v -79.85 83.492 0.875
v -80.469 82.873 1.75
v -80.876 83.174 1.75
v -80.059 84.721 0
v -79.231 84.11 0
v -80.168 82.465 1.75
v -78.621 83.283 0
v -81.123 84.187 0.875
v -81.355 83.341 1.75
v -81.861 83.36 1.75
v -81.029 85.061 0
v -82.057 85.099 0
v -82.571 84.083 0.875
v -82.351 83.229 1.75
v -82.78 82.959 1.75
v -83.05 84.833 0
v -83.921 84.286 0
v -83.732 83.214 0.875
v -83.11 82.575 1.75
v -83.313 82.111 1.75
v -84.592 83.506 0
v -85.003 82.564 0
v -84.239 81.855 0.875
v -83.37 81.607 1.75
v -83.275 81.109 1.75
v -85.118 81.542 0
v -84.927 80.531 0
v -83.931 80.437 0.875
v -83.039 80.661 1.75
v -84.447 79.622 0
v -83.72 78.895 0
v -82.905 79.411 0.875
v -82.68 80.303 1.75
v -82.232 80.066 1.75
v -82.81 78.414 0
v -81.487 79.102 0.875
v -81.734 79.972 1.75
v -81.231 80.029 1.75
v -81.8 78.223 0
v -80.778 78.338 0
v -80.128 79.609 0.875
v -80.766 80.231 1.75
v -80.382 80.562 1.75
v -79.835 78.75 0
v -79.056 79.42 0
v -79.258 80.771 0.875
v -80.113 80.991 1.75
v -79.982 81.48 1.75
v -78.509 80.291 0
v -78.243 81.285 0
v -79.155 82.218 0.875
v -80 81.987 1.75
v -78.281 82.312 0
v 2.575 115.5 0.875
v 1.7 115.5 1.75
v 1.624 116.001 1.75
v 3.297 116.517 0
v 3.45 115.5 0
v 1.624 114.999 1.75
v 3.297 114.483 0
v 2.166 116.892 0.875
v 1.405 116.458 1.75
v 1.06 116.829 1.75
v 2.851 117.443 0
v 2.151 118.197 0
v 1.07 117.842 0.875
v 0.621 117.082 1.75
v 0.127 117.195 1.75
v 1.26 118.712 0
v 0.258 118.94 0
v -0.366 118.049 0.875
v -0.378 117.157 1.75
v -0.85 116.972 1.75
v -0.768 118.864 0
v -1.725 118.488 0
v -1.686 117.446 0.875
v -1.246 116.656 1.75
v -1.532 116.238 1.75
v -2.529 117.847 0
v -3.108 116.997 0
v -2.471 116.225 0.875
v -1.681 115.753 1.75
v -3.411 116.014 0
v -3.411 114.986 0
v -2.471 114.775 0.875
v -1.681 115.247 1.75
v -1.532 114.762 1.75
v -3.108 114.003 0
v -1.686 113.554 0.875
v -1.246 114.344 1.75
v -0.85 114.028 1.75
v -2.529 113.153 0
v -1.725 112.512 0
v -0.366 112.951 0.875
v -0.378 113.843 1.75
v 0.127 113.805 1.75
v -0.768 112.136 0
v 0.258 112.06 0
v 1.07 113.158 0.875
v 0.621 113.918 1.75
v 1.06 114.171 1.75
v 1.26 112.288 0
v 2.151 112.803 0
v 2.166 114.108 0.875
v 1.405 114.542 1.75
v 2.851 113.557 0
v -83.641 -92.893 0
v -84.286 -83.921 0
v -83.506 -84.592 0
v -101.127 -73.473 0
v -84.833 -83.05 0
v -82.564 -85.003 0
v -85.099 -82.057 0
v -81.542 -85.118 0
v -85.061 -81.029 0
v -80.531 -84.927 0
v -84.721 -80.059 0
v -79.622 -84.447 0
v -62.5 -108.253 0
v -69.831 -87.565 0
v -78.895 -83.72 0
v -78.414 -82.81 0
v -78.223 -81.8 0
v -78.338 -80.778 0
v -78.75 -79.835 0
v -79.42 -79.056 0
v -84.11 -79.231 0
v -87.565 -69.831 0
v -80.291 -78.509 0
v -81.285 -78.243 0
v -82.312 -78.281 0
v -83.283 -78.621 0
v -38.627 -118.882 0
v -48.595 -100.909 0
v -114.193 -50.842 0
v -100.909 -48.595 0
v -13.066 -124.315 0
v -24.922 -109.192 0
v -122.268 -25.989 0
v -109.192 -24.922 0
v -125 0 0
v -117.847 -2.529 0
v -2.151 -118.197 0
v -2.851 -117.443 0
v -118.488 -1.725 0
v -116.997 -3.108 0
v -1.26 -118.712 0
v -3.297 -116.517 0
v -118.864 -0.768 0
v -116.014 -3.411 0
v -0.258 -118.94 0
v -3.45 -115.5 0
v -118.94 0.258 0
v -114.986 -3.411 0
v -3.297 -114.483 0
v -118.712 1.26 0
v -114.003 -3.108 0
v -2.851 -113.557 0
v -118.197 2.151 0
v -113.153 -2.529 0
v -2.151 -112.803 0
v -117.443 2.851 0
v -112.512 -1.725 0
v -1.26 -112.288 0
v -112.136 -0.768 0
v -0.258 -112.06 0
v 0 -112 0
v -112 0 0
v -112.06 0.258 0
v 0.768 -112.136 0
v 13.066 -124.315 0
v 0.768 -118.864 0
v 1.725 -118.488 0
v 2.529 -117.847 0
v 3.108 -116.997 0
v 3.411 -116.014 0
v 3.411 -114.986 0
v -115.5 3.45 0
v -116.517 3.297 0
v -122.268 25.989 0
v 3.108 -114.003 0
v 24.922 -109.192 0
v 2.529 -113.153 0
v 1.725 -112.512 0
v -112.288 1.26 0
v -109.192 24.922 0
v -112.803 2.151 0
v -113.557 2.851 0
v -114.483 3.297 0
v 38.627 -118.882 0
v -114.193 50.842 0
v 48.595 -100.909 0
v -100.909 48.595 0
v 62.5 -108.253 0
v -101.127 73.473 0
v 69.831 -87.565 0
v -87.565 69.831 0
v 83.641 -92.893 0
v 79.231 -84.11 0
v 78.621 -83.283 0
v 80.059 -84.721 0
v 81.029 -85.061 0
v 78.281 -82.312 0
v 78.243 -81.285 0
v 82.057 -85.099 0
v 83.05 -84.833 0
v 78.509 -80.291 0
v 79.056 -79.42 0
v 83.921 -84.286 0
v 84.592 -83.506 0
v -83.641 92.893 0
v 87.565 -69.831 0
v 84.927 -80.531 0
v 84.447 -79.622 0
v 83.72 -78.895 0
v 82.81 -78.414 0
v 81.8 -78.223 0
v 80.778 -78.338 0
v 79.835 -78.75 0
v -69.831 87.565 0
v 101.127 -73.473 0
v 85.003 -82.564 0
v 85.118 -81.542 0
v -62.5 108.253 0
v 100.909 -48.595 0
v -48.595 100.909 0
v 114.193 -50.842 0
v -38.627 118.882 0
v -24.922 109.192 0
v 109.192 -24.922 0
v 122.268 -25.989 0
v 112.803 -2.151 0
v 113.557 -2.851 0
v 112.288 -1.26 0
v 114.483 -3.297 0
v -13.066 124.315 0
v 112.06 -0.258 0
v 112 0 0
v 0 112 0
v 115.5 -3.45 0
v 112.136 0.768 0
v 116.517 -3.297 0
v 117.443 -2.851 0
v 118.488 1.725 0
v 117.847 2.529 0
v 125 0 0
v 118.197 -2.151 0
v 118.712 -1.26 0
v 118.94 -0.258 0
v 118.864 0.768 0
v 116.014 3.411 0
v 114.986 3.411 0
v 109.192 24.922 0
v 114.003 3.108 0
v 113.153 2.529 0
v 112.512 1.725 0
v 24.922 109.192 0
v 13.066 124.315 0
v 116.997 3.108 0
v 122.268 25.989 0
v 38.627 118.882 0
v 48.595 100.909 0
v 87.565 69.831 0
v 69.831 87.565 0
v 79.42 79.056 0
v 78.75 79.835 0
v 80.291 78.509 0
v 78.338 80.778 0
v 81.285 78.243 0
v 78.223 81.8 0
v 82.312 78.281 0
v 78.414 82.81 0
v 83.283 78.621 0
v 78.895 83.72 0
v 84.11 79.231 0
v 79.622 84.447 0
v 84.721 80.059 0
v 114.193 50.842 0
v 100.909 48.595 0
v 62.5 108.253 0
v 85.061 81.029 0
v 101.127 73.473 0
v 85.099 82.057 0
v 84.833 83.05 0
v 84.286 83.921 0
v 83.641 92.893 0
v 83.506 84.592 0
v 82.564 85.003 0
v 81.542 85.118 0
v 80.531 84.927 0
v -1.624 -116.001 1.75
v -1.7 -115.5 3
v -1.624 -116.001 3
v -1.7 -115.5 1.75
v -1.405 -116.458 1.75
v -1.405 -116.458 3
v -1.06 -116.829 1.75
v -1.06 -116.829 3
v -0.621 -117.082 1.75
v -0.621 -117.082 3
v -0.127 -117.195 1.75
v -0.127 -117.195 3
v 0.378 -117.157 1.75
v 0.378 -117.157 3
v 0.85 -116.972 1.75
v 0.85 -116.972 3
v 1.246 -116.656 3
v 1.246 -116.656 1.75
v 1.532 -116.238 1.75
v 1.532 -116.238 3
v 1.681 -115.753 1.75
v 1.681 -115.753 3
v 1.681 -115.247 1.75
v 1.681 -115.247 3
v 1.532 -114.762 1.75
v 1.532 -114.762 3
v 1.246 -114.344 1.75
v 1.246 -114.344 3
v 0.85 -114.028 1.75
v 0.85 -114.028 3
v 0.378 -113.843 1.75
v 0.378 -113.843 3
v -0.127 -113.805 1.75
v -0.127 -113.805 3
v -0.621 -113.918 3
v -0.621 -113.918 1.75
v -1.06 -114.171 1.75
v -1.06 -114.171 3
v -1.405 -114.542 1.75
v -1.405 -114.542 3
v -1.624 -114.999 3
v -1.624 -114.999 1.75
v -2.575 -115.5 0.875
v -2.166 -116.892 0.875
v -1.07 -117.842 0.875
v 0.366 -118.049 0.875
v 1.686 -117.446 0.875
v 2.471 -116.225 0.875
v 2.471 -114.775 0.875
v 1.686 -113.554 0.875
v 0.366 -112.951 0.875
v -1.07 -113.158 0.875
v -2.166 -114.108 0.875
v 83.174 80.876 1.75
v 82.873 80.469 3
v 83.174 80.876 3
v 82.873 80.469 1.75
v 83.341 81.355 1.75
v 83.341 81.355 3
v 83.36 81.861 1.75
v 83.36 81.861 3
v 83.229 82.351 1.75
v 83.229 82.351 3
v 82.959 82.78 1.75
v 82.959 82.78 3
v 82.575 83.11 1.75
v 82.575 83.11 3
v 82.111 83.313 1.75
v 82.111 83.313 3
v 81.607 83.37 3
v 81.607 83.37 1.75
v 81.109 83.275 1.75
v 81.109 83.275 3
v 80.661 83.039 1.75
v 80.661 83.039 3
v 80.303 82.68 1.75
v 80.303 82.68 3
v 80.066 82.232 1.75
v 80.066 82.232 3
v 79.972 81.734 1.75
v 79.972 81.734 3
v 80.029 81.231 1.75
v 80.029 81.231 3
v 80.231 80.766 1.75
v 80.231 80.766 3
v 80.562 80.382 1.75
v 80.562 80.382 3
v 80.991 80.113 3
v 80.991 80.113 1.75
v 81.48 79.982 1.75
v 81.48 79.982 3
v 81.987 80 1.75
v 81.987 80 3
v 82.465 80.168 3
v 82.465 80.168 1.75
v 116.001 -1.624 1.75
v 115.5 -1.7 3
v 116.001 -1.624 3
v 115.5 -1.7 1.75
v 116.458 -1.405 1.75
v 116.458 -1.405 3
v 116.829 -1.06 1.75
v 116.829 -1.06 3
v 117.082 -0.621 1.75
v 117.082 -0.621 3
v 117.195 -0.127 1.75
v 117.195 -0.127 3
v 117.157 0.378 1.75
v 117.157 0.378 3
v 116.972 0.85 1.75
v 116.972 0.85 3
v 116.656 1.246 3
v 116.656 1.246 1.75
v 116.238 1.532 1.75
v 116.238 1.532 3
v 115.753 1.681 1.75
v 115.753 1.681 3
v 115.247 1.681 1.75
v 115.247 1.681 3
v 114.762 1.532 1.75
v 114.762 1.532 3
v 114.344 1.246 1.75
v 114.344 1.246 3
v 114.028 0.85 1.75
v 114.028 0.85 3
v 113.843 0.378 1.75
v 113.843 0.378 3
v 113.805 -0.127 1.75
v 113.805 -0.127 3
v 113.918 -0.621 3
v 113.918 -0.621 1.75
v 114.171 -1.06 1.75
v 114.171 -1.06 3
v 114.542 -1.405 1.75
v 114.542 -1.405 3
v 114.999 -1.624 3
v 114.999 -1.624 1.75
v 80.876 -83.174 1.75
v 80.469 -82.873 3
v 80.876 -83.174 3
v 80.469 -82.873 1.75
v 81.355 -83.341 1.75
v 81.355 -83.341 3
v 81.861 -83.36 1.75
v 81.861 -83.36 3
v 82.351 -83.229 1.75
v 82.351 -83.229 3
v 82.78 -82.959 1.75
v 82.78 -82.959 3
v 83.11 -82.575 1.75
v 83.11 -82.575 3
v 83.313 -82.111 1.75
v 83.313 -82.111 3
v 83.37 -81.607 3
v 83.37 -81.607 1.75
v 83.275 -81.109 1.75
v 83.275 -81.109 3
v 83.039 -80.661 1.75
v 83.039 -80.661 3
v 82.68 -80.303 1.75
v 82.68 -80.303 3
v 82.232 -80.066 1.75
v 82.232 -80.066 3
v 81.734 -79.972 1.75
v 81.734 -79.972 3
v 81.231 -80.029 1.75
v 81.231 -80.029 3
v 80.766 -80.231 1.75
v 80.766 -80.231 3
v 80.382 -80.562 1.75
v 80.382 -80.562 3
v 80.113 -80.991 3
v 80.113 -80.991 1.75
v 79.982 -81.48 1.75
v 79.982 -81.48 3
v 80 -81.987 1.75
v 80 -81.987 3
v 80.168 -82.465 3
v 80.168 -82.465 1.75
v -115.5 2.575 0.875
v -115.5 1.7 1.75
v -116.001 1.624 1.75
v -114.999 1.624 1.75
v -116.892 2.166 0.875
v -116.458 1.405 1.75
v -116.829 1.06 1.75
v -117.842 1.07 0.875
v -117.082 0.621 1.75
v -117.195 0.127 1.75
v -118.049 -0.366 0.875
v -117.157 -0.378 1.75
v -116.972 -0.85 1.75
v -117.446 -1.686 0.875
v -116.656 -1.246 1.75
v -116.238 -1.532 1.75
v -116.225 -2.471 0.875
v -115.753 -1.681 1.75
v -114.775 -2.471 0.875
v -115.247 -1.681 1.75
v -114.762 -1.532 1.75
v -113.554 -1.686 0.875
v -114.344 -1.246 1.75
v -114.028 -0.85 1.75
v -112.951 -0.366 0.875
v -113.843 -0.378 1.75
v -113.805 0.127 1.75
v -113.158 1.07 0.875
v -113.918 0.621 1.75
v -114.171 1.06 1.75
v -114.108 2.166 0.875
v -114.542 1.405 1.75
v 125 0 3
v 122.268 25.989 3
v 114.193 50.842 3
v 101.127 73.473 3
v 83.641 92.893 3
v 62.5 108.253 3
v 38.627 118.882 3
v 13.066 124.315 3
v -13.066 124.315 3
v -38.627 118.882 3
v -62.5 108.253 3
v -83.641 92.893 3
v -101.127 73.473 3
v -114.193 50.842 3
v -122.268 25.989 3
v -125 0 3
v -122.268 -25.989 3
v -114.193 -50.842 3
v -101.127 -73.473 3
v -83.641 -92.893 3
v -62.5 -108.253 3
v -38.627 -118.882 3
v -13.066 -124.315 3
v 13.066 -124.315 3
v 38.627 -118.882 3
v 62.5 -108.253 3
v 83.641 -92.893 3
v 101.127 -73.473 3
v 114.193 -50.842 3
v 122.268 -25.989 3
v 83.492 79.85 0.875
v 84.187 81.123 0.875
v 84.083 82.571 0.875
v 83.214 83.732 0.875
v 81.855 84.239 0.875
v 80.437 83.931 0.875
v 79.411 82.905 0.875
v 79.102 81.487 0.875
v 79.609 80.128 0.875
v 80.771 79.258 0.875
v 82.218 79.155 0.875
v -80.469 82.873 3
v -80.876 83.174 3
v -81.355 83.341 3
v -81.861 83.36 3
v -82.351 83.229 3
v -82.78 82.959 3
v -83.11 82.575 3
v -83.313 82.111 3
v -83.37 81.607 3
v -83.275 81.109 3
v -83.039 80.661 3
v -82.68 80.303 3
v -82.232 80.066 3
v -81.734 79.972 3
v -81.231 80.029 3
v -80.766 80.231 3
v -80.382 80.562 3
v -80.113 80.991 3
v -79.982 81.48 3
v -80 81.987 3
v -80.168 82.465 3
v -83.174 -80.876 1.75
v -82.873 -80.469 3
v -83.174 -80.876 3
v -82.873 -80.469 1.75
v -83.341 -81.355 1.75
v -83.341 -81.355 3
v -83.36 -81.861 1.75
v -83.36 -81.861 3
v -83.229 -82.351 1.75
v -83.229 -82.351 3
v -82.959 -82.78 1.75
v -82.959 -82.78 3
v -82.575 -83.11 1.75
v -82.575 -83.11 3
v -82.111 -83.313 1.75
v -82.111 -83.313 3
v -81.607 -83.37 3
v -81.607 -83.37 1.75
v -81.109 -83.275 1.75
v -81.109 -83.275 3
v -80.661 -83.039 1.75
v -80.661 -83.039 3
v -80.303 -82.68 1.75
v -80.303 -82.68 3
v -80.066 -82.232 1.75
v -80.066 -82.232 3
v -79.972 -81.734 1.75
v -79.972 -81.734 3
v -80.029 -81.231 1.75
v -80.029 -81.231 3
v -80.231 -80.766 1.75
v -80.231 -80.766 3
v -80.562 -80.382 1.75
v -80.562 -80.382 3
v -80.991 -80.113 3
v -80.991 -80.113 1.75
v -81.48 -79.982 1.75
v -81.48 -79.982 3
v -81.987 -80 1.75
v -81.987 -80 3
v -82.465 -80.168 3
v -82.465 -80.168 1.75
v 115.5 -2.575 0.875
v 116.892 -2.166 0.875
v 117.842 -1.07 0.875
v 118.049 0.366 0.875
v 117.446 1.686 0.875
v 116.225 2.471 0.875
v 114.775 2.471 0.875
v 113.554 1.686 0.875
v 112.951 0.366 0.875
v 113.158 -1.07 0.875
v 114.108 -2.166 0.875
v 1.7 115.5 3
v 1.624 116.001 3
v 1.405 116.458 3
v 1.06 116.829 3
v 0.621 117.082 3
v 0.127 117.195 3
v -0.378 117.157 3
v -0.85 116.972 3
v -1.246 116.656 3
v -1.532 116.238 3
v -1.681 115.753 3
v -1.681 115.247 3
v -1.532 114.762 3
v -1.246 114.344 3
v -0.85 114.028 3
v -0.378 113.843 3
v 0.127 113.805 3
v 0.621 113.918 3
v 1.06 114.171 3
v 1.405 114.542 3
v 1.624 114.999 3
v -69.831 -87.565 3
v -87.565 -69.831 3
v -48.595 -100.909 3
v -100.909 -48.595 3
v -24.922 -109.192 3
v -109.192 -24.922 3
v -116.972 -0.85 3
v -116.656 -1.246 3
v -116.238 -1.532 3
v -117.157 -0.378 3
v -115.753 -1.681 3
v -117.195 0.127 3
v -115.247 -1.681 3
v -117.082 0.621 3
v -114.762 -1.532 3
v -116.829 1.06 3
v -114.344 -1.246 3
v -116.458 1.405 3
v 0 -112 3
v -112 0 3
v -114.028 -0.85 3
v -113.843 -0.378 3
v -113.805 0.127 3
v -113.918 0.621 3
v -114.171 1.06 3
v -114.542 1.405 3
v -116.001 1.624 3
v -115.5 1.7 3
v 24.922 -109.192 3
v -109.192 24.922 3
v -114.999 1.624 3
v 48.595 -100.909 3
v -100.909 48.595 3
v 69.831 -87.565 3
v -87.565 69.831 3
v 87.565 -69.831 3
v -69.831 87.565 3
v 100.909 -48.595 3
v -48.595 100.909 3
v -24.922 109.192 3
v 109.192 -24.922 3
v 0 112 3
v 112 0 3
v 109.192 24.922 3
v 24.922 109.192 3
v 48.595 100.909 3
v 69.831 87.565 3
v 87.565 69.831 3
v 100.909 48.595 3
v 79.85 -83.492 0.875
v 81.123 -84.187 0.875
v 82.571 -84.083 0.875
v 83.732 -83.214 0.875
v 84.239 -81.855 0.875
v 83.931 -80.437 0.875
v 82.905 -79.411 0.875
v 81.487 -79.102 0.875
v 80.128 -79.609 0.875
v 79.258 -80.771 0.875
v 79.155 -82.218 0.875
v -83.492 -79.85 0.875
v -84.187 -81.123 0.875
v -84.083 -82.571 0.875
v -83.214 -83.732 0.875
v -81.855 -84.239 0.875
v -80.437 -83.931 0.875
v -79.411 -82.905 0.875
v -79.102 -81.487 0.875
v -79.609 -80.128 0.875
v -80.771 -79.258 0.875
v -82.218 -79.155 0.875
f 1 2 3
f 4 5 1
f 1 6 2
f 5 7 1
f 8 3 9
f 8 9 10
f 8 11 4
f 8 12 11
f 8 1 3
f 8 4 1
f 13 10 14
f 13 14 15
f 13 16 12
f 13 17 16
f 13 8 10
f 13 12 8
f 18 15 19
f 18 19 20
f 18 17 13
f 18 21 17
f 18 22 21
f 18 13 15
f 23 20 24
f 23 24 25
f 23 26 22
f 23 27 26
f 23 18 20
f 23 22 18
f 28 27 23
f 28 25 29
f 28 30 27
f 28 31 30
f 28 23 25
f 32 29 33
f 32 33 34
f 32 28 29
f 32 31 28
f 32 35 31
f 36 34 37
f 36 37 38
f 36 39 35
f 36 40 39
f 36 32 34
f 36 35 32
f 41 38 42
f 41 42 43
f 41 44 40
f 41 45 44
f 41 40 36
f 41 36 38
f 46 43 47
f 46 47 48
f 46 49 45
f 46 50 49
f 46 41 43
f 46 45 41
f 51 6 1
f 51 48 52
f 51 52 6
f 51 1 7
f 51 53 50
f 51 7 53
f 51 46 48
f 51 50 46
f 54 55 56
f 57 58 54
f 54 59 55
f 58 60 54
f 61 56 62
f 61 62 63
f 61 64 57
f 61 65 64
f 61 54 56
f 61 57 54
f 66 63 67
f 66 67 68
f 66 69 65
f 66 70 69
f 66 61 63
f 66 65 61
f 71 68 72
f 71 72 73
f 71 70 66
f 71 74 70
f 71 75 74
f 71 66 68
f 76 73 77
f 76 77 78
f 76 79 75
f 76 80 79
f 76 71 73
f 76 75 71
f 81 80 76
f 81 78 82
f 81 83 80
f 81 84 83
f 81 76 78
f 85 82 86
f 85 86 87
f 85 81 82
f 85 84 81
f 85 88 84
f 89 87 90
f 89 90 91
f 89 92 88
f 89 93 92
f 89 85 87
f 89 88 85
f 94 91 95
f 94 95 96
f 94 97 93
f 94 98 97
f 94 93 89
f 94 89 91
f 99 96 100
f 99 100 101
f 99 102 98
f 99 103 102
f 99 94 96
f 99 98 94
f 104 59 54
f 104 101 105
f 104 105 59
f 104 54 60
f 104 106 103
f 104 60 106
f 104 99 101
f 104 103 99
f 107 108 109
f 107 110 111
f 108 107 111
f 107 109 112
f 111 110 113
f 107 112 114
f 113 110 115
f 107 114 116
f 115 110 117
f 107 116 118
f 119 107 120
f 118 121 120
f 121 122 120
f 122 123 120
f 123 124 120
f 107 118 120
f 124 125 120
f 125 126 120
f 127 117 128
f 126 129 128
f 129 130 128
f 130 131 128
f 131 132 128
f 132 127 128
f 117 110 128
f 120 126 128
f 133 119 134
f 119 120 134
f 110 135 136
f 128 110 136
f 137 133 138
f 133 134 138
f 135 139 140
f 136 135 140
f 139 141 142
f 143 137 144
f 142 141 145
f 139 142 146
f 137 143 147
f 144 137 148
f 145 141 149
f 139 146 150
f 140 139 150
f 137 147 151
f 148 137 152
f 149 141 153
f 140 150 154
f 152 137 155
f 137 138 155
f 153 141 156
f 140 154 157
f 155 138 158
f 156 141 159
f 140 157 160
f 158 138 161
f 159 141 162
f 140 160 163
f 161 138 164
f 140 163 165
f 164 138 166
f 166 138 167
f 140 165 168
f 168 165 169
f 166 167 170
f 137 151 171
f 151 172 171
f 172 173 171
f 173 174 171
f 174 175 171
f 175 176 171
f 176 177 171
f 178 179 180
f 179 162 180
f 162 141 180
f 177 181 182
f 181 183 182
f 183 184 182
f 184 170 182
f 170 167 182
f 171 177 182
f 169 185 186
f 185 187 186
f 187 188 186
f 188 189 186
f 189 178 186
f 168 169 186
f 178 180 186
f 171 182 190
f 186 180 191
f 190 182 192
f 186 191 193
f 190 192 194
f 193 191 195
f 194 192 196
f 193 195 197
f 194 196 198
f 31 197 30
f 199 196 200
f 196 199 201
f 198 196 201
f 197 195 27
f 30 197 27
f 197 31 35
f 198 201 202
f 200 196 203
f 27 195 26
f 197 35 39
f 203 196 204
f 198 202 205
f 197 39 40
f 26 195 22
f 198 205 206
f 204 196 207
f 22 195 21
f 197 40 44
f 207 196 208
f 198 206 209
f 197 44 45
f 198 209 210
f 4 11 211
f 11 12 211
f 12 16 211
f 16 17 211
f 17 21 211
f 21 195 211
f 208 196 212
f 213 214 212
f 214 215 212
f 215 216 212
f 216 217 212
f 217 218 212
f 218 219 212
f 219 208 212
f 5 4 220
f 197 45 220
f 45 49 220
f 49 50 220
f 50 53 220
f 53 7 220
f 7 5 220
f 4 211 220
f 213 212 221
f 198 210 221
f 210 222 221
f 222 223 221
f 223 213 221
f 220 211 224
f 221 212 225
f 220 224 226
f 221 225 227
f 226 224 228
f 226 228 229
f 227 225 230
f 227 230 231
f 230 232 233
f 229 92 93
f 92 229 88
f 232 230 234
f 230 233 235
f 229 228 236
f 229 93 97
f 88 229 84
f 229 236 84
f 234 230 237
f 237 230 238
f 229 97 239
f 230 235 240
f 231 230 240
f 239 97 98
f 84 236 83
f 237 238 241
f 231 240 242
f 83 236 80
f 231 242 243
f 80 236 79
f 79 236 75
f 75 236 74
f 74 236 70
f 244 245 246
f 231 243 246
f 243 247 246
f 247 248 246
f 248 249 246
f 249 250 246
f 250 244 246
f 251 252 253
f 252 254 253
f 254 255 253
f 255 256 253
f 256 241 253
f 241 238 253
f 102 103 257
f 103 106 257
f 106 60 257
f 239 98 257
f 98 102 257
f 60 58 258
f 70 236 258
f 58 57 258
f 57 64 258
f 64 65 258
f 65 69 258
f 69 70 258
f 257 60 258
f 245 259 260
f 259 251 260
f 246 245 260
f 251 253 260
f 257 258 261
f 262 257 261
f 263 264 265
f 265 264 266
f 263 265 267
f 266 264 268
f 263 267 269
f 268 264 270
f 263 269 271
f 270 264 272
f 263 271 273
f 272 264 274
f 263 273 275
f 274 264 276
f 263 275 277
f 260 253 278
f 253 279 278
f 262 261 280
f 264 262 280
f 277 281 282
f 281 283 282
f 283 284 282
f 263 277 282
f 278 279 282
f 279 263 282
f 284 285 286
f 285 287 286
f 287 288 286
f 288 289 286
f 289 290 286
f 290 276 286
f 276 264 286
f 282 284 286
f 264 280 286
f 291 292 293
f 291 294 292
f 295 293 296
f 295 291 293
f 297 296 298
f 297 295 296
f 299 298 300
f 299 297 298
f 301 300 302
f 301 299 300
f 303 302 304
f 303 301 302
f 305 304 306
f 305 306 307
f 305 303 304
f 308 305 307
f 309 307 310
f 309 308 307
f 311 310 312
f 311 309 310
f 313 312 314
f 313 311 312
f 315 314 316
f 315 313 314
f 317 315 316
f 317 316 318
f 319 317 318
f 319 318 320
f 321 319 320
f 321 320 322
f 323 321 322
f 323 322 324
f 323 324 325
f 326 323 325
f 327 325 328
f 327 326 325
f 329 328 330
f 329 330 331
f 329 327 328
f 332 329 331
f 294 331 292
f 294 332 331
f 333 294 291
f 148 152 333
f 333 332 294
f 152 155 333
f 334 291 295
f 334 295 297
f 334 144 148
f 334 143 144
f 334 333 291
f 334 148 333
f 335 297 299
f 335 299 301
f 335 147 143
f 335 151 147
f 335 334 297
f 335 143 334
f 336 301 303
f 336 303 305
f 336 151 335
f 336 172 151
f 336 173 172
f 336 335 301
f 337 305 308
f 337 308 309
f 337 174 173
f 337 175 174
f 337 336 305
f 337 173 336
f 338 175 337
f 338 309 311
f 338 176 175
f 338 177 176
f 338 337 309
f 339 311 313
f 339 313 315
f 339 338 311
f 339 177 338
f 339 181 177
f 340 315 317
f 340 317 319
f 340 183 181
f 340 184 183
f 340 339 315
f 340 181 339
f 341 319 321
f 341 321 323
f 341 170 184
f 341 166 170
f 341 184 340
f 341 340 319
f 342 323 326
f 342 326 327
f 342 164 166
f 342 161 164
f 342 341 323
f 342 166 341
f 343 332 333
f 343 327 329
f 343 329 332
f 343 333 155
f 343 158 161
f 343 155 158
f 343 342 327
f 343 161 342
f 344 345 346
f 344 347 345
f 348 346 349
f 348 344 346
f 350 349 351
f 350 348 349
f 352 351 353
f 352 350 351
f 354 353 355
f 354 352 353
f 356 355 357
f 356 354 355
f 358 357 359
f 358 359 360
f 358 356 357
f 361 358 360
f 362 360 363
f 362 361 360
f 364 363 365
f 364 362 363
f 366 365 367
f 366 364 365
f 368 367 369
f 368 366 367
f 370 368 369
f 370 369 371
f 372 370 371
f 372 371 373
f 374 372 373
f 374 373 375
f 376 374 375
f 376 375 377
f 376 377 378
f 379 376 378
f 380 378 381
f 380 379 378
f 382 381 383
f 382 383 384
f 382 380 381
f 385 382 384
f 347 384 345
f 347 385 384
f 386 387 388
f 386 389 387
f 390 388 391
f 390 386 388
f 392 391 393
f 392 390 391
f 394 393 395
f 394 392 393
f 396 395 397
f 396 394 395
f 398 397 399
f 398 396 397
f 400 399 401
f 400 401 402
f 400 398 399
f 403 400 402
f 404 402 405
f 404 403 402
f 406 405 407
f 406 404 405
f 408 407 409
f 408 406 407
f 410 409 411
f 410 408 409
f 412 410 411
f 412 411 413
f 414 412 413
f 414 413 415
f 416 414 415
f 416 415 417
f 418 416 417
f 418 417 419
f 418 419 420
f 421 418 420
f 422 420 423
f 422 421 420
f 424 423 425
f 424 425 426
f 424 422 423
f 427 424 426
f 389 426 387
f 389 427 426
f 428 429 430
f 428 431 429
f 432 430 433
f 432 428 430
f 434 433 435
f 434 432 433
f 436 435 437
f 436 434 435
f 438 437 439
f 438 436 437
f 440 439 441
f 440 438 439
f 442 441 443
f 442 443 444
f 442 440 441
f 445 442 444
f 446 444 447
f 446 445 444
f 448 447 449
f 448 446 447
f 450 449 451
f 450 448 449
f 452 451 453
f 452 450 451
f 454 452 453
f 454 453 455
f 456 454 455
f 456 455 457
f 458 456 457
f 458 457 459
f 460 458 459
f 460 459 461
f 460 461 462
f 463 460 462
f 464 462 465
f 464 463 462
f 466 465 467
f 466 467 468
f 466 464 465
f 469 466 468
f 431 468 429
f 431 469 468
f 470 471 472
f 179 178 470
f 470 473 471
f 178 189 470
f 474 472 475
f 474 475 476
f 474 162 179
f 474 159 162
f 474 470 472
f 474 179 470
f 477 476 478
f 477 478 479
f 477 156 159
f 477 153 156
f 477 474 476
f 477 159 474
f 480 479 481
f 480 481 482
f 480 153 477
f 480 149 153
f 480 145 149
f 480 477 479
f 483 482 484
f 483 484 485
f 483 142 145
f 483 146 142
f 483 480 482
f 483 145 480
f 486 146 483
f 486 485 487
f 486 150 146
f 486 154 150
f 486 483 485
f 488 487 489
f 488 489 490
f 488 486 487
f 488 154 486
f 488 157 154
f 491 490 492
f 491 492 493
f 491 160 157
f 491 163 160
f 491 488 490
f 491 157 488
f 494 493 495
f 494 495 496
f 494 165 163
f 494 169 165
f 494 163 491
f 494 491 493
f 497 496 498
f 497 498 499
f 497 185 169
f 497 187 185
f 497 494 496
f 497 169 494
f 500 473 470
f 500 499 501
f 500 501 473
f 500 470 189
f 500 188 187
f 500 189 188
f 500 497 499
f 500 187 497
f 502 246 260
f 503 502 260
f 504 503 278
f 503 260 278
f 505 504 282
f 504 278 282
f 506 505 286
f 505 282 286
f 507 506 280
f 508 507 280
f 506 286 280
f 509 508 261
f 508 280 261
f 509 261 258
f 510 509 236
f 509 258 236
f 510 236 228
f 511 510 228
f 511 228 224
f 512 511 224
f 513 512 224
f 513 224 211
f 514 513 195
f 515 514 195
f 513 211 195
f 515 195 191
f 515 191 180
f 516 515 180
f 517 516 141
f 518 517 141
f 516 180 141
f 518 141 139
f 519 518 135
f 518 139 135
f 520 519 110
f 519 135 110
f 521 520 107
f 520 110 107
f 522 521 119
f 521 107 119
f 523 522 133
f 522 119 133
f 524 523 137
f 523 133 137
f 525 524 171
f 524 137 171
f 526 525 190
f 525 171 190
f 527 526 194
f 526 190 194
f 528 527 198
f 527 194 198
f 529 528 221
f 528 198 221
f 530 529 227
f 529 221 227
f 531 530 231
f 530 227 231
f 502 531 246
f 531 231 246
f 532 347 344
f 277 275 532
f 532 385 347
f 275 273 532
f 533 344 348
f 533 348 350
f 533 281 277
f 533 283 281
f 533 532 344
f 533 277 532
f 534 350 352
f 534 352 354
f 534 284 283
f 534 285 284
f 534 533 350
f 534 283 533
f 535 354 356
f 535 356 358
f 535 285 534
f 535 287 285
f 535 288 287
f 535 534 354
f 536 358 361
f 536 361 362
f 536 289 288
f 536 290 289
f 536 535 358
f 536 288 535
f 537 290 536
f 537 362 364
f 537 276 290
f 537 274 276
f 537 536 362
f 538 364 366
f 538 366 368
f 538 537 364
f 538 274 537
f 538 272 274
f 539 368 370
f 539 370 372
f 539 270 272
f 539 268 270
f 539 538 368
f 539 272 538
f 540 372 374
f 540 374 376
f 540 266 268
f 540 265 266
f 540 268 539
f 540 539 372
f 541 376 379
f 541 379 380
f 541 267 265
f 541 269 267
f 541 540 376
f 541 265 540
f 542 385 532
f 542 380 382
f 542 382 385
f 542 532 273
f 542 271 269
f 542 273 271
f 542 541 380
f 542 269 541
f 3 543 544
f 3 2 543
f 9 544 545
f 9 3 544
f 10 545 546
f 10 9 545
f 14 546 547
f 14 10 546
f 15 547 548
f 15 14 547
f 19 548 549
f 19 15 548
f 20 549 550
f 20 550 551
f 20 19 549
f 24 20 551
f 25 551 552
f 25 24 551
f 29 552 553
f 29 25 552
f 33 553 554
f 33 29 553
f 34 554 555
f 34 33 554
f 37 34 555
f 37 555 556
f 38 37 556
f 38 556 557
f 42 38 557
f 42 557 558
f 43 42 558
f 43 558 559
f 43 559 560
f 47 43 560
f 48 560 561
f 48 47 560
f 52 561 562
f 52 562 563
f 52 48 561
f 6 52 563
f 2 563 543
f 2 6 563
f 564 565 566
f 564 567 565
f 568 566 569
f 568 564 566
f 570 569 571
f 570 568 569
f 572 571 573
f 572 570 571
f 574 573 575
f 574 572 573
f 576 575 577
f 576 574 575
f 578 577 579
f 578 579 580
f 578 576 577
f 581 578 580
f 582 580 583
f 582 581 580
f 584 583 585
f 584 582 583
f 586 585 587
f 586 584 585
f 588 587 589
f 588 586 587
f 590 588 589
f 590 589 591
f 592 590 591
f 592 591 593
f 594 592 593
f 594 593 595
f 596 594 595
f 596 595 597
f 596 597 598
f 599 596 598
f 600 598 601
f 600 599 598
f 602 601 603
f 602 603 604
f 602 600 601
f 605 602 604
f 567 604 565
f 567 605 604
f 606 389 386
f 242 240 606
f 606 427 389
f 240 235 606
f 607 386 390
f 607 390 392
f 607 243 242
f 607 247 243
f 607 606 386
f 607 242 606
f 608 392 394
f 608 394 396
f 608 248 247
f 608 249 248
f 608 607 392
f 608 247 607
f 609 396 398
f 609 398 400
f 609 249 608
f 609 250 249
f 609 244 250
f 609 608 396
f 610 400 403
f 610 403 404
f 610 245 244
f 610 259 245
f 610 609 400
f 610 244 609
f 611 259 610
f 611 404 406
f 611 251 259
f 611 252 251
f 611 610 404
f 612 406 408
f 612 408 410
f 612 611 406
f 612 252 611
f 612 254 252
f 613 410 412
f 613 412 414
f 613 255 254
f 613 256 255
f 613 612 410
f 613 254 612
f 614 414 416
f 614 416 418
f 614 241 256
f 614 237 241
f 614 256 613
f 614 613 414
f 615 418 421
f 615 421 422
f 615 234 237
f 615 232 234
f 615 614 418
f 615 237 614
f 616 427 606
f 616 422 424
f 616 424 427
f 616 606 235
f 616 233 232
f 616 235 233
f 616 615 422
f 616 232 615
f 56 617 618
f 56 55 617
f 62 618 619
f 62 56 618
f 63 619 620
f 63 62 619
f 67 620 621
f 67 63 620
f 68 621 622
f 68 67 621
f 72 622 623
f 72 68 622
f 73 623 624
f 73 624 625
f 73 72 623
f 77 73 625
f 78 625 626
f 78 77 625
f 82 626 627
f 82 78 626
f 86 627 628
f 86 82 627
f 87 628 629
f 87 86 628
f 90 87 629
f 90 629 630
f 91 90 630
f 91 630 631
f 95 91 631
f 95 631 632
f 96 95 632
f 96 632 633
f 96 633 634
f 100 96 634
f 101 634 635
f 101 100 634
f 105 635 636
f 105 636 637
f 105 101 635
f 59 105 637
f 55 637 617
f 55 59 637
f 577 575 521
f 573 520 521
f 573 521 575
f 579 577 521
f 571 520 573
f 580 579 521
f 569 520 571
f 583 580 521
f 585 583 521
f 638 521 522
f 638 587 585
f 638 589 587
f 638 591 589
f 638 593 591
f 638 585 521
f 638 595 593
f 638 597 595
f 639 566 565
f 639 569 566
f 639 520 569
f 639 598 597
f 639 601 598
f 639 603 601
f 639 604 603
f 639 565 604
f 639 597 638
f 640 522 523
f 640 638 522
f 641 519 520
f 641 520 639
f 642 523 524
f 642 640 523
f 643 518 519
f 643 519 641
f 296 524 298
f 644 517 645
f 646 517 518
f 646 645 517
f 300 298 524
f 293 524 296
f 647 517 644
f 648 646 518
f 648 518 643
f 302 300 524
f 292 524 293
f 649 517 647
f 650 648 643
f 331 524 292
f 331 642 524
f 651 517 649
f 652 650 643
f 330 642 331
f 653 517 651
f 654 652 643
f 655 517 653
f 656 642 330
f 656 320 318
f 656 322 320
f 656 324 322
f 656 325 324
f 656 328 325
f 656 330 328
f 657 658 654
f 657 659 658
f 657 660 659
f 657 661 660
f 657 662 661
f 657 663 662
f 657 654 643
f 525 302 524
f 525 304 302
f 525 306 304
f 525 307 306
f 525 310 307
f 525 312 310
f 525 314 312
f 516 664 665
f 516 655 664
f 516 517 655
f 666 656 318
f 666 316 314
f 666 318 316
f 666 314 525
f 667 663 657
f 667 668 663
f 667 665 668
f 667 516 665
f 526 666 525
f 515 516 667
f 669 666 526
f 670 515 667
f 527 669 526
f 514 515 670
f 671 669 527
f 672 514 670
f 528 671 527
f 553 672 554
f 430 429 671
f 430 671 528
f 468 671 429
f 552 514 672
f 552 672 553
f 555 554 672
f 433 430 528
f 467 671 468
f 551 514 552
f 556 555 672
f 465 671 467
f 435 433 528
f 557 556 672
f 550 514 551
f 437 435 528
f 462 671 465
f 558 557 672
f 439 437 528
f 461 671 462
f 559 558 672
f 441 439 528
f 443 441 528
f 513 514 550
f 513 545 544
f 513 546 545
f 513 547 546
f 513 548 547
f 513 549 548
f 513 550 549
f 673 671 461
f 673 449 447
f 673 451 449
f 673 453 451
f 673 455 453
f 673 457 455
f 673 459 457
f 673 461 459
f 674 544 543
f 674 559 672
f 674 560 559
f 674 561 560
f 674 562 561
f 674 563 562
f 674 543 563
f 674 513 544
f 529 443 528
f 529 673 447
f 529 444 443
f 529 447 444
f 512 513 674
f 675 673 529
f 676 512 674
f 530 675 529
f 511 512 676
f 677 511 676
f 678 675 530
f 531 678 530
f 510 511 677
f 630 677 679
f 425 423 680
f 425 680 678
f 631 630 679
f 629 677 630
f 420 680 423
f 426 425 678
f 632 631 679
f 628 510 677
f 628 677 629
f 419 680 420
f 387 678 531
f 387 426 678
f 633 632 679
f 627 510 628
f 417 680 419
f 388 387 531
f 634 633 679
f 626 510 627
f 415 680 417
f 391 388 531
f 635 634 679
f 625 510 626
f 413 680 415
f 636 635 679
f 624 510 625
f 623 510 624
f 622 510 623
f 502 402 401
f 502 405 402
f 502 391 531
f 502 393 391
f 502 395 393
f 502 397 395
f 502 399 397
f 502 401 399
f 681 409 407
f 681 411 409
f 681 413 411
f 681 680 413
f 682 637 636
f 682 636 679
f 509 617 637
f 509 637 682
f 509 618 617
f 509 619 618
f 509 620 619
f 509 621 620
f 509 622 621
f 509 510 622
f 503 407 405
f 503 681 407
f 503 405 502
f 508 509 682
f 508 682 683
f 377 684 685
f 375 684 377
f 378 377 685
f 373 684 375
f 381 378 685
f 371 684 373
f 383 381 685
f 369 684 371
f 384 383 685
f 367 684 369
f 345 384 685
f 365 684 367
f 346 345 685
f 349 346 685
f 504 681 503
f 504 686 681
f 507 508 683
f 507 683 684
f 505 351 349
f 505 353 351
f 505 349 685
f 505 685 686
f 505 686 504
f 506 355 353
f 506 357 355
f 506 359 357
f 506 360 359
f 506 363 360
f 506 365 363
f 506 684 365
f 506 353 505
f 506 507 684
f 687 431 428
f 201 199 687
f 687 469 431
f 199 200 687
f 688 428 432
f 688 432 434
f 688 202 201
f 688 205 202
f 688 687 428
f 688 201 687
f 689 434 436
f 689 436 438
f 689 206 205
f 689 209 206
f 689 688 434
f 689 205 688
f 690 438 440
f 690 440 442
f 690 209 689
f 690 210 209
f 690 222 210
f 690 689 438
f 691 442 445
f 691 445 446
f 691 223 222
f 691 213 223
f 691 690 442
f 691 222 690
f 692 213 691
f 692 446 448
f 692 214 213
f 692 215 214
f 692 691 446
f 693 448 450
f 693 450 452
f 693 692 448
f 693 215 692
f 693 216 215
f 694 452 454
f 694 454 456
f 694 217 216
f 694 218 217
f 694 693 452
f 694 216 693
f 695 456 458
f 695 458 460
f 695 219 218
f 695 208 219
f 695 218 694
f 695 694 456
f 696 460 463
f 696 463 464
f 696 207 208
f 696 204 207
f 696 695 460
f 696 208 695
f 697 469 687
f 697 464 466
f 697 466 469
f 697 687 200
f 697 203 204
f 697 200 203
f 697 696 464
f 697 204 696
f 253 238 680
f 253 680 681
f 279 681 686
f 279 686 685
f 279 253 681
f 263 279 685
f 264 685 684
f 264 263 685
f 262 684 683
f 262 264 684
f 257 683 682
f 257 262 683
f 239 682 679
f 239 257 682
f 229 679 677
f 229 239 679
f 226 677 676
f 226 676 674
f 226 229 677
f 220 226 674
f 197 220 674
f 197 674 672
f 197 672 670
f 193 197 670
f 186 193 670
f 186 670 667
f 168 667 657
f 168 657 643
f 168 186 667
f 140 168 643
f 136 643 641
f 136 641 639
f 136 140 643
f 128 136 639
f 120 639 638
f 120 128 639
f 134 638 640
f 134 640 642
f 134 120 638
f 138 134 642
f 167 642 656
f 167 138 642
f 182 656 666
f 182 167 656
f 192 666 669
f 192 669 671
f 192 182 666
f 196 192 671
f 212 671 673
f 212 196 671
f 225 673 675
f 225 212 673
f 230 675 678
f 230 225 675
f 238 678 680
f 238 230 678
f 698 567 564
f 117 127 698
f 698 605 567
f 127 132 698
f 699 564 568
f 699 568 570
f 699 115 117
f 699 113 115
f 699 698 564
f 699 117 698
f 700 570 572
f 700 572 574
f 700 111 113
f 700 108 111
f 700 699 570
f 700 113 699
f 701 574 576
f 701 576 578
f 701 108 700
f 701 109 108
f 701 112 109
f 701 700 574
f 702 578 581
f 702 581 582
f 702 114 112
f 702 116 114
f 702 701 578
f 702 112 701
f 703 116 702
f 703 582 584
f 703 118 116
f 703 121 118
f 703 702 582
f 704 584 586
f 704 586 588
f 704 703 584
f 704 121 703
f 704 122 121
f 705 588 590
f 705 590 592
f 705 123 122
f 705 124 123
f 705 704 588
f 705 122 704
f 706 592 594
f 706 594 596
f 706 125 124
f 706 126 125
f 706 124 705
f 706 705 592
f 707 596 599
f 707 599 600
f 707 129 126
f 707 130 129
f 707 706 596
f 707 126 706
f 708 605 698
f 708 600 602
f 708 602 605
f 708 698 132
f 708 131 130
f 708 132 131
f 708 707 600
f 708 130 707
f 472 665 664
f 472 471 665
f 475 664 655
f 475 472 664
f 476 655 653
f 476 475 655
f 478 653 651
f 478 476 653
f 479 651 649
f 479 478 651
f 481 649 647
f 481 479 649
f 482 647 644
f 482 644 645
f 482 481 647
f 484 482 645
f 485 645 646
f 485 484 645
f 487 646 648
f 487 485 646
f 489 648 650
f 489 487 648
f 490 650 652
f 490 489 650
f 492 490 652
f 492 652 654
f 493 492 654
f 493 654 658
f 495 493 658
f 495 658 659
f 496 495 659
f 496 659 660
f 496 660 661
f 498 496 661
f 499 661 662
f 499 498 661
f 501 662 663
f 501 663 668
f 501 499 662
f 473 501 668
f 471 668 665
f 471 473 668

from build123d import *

# Parameters (mm, degrees)
SKETCH1_R           = 125
SKETCH1_R_2         = 112
BOSS_EXTRUDE1_DEPTH = 3
CIRPATTERN1_COUNT   = 8


with BuildPart() as part:
    # Sketch1 → Boss-Extrude1 (new body)
    with BuildSketch(Plane.XY):
        Circle(SKETCH1_R)
        Circle(SKETCH1_R_2, mode=Mode.SUBTRACT)
    extrude(amount=BOSS_EXTRUDE1_DEPTH)

    # Sketch3 → CSK for M3 Countersunk Flat Head Screw1 (revolve, cut)
    with BuildSketch(Plane.YZ.offset(-115.5)):
        Polygon((0, 0), (0, 3), (1.7, 3), (1.7, 1.75), (3.45, 0), align=None)
    csk_for_m3_countersunk_flat_head_screw1 = revolve(axis=Axis((-115.5, 0, -6.35), (0, 0, 1)), mode=Mode.SUBTRACT)

    # CirPattern1: CSK for M3 Countersunk Flat Head Screw1 ×8 about axis
    cirpattern1_axis = Axis((0, 0, 0), (0, 0, 1))
    for i in range(1, CIRPATTERN1_COUNT):
        add(csk_for_m3_countersunk_flat_head_screw1.rotate(cirpattern1_axis, i * 360 / CIRPATTERN1_COUNT), mode=Mode.SUBTRACT)


solid = part.part
